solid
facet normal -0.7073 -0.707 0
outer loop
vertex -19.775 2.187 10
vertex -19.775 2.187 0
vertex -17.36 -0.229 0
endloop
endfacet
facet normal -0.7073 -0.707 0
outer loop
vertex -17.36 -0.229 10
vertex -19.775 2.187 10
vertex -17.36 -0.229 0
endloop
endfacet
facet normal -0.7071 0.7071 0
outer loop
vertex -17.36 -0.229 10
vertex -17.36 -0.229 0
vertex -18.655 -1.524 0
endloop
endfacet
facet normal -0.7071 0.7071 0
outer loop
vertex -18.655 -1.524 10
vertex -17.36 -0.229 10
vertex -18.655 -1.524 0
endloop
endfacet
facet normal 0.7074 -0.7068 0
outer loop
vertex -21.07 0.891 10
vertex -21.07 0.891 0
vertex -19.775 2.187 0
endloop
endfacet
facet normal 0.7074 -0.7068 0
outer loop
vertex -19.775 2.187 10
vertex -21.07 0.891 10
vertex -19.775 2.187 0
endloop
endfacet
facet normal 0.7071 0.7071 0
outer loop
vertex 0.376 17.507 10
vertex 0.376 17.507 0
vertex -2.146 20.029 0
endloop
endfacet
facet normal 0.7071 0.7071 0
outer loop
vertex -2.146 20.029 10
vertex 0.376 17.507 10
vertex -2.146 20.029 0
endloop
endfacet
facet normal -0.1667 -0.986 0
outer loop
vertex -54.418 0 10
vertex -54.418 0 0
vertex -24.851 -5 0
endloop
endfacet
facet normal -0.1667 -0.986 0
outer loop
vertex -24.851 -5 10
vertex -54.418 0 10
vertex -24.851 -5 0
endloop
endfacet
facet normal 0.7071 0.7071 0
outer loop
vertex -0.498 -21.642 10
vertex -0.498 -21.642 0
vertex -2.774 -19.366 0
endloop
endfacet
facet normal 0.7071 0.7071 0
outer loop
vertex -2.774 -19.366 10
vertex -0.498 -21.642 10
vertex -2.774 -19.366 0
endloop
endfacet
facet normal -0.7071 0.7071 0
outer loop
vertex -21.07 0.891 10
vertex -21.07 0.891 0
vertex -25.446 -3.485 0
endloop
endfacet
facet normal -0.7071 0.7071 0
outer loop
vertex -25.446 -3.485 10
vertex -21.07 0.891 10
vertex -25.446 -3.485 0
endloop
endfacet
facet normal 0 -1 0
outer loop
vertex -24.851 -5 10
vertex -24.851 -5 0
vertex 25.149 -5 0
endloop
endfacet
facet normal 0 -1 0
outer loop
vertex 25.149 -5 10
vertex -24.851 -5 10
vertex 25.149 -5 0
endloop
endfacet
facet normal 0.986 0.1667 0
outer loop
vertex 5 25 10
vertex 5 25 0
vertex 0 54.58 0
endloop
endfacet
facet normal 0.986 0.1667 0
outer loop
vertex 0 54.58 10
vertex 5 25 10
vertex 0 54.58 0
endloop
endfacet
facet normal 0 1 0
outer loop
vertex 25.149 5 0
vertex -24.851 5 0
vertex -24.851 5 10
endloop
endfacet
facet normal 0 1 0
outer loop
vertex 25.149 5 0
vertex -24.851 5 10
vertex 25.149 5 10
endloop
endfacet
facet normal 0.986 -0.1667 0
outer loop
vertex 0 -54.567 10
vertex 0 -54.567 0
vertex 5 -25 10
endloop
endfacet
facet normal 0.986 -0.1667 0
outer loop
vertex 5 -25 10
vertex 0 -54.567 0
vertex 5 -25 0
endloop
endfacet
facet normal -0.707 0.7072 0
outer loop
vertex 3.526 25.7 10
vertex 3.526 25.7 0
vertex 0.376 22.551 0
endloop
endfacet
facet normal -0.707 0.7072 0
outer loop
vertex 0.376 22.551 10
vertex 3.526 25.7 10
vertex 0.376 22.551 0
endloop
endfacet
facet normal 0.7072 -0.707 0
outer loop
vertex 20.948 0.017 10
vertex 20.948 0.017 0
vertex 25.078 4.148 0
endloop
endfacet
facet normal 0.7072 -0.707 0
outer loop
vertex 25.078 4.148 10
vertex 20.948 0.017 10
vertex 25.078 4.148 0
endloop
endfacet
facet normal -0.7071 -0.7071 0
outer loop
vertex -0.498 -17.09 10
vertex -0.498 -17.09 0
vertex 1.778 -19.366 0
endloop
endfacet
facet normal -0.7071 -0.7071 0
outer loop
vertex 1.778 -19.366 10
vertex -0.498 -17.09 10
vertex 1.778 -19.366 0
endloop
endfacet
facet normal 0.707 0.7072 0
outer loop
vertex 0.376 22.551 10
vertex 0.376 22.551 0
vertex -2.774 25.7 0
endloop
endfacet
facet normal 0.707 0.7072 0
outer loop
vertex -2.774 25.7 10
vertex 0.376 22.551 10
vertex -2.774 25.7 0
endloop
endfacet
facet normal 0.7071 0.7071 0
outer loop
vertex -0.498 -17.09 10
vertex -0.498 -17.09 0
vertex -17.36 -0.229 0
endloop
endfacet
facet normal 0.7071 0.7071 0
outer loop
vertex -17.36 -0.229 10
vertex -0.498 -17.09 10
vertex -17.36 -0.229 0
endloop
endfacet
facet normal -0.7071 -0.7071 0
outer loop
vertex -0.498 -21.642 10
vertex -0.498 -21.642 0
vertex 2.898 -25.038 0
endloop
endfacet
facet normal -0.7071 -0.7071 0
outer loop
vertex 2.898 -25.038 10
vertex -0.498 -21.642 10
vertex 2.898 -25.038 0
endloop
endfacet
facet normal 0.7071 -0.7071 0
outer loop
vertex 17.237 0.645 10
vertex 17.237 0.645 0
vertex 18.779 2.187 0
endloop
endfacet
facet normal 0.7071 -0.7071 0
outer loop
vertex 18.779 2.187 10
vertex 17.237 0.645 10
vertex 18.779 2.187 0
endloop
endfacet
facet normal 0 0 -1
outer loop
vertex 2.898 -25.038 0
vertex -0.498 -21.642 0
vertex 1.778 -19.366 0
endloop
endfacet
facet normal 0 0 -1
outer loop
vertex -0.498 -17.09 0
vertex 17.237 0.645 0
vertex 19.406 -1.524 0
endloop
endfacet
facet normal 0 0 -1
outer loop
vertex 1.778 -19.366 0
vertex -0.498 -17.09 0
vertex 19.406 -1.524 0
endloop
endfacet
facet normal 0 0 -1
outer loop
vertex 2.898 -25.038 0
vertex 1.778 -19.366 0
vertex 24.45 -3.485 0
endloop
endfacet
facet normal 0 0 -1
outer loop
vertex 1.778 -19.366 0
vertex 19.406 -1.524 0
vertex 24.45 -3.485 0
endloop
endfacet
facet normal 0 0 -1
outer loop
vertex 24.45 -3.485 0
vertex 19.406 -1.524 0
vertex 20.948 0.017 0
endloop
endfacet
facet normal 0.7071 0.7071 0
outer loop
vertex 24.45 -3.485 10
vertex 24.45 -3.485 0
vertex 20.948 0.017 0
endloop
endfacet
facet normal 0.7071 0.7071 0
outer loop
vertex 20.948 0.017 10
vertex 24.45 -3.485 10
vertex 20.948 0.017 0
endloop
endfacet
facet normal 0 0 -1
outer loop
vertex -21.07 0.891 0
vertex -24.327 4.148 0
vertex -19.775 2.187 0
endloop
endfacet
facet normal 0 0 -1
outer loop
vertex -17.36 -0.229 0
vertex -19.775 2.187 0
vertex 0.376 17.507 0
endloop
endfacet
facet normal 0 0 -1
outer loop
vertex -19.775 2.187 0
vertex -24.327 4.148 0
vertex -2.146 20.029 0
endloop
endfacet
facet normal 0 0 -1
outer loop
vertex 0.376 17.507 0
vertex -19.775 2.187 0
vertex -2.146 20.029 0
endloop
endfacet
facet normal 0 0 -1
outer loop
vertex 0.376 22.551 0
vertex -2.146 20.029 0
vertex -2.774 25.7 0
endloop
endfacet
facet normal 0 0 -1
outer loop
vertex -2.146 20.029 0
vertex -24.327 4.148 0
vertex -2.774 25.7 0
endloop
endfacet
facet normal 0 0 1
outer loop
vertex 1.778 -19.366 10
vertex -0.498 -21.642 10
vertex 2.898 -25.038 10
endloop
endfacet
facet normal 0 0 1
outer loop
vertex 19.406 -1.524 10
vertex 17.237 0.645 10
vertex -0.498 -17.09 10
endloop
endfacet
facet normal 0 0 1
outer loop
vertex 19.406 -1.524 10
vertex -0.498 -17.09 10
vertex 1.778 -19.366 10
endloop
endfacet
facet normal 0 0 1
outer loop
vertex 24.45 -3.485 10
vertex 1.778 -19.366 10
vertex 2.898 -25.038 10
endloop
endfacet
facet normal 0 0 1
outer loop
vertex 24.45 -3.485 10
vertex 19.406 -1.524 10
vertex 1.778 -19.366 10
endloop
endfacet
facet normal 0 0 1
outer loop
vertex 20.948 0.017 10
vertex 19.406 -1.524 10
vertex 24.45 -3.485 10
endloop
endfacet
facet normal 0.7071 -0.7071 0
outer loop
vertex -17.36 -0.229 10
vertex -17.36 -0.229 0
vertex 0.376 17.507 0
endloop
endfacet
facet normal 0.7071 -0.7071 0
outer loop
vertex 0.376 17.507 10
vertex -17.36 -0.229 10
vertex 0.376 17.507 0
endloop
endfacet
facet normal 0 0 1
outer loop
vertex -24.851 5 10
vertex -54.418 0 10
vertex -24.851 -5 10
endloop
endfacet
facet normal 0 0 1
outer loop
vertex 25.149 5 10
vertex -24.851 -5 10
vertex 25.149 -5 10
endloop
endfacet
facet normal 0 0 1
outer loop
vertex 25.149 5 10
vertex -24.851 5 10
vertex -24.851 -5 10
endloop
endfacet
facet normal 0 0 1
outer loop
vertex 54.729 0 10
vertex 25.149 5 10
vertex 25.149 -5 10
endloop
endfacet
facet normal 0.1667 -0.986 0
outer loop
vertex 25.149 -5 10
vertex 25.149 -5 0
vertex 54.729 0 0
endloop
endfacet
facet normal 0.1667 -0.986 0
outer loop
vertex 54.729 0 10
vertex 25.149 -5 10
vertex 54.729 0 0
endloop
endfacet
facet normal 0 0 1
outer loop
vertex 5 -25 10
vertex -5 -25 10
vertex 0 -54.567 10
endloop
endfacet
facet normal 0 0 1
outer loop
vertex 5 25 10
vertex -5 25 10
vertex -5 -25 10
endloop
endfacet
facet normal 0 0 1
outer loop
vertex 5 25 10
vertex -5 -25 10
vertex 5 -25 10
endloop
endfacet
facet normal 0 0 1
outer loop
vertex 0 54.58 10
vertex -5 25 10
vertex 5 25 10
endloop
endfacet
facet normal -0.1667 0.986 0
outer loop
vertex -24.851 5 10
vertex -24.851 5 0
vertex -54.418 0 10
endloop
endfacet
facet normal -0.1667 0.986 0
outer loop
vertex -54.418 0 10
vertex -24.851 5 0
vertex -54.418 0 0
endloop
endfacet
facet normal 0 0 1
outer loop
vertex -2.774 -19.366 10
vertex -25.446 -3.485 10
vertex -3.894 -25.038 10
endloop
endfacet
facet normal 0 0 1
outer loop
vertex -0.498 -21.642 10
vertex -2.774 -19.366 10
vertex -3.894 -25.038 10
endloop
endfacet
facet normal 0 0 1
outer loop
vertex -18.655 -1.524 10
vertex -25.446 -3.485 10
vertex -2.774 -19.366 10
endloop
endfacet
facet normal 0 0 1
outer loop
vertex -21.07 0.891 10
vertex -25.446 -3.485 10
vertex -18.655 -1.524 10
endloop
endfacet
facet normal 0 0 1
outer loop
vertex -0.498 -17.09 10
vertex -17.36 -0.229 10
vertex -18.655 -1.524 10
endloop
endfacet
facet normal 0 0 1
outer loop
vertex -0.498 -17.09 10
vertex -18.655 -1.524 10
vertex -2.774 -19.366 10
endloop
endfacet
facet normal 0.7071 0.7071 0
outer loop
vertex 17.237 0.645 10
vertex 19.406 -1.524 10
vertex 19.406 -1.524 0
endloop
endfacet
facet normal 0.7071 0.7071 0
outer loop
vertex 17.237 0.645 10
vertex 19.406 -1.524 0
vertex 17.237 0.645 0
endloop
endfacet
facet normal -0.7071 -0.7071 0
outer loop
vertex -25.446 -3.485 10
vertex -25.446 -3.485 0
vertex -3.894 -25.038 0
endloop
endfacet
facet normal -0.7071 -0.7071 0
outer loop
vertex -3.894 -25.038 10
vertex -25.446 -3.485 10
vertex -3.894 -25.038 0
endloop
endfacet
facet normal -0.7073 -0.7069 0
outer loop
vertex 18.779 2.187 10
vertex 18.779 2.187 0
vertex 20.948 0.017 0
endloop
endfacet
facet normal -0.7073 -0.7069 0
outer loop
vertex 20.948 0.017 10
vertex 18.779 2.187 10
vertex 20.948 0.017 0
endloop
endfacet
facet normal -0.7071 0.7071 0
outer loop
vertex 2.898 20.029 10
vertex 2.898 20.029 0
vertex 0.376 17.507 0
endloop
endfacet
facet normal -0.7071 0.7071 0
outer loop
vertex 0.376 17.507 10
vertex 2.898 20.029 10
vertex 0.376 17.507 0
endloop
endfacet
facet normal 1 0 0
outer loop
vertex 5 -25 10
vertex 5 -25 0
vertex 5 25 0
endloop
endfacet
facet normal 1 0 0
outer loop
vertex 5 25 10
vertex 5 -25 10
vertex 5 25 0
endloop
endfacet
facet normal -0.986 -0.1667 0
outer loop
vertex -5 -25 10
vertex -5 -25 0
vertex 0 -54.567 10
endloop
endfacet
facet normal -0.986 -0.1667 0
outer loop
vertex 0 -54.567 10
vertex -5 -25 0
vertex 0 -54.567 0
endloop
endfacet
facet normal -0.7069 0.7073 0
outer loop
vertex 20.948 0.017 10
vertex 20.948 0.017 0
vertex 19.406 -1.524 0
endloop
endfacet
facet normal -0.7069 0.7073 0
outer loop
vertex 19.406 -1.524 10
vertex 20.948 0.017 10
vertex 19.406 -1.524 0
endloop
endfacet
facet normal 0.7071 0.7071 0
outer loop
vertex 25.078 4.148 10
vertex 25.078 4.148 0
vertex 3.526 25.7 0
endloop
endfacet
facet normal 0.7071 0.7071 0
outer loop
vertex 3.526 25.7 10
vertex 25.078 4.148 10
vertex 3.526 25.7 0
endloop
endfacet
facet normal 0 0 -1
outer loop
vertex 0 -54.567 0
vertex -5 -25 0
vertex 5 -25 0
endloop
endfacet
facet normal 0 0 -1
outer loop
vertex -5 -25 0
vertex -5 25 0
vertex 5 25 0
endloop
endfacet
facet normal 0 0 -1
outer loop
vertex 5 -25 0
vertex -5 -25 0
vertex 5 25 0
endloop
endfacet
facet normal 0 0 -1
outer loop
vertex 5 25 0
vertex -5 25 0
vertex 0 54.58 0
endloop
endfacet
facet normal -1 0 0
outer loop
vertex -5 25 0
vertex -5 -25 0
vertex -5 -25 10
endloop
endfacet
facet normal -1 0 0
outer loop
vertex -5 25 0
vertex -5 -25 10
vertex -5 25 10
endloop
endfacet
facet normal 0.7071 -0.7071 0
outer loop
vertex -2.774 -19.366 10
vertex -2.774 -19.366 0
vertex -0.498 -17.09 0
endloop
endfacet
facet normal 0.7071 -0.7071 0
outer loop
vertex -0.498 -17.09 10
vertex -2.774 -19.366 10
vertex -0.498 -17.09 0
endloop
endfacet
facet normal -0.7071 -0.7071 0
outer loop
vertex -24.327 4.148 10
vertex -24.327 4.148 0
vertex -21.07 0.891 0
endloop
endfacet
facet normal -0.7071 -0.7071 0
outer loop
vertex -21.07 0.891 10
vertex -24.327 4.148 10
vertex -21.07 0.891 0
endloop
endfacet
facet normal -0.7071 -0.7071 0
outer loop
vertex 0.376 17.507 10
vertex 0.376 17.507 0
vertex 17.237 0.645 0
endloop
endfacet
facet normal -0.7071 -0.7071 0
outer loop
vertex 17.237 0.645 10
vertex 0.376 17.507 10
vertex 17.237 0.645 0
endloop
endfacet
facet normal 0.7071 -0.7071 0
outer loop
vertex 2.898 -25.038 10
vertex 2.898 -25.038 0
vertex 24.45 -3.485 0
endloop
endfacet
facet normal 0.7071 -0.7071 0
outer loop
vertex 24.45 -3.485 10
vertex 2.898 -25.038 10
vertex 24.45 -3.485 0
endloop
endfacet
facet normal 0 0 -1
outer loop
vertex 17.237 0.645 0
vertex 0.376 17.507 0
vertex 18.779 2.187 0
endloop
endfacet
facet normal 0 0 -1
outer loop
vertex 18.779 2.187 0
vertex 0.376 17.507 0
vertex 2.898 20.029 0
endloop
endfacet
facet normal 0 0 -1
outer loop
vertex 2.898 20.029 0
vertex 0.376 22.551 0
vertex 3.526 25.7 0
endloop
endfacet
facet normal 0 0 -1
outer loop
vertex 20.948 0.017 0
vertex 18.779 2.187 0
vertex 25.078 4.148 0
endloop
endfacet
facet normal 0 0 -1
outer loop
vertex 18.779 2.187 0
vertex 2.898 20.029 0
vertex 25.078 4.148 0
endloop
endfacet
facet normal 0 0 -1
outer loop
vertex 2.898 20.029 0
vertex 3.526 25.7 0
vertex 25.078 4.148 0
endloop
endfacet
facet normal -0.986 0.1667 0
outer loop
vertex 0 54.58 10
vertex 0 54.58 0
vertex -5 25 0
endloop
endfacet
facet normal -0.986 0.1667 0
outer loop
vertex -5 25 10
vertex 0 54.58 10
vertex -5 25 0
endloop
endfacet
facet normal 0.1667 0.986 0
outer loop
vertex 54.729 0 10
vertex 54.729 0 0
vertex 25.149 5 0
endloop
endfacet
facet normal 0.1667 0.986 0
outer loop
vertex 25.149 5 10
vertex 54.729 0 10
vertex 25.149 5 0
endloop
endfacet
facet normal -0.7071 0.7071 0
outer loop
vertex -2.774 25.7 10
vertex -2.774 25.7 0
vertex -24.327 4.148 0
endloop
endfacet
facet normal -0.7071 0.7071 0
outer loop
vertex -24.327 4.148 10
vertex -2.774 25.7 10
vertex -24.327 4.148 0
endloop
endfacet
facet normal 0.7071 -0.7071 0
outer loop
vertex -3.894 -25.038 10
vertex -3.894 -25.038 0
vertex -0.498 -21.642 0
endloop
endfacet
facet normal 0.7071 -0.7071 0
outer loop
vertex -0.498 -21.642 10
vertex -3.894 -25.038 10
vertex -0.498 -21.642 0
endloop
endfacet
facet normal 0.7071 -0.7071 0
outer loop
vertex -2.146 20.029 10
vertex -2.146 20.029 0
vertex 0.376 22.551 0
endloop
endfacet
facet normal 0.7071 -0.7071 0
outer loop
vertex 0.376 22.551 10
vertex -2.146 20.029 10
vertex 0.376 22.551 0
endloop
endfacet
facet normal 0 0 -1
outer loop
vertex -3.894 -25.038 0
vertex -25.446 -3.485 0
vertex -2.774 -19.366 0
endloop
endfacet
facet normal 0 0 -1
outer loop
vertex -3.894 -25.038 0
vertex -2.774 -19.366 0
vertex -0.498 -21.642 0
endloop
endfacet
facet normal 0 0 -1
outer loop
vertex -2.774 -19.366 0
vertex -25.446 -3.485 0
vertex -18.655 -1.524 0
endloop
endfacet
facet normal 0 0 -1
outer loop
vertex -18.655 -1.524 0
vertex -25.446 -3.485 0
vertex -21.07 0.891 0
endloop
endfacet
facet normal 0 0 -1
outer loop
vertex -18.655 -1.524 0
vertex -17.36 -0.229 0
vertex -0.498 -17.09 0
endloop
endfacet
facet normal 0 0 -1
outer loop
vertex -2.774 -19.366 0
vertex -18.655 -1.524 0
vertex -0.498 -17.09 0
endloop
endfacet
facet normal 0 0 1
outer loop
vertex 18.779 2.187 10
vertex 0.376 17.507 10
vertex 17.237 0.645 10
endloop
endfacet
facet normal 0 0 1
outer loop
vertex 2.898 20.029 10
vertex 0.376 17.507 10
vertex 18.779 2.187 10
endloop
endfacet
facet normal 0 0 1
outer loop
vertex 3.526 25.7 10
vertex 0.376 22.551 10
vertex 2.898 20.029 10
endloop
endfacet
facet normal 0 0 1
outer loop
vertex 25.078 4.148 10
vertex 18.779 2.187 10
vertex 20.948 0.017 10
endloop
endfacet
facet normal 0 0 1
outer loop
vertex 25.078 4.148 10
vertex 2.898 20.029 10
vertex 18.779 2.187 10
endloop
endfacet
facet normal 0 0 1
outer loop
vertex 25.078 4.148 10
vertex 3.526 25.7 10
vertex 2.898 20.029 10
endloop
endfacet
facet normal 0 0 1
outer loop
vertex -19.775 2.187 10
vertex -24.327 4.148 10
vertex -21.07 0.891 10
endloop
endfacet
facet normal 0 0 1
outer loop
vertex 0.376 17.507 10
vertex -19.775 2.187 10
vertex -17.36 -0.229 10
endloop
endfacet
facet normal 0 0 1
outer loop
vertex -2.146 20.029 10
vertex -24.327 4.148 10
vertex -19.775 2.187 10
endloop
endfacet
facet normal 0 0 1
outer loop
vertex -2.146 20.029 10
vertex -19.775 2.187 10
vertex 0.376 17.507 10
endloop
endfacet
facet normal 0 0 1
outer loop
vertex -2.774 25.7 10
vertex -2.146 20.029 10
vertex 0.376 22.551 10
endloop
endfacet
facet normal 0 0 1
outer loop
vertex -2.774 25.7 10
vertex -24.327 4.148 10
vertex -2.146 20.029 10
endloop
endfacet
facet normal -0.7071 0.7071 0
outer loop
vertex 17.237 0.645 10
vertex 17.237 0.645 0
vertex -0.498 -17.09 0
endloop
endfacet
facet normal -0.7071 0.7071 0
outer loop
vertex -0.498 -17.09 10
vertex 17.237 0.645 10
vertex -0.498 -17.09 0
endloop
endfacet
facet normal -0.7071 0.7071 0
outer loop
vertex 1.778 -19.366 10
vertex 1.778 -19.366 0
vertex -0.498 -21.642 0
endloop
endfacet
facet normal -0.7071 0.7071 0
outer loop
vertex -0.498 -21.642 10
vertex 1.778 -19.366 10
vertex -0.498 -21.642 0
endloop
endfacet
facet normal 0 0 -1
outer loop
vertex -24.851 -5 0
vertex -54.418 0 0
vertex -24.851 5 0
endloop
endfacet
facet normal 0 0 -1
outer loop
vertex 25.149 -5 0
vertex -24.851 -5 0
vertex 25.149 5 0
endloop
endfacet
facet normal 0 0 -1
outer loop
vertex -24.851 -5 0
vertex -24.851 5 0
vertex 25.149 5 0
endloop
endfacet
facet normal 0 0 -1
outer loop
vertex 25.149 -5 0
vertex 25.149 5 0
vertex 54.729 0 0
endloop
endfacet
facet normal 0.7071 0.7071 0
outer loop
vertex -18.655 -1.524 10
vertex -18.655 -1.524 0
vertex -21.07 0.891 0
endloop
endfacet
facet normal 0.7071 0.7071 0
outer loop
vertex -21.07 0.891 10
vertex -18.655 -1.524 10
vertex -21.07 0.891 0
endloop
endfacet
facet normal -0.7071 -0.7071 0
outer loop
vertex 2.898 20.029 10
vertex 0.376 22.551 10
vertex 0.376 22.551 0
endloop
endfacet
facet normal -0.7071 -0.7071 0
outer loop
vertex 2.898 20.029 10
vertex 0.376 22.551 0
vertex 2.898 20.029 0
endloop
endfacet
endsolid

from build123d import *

# Parameters (mm, degrees)
F3_DEPTH = 10
F0_W     = 10
F0_H     = 50
F1_W     = 50
F1_H     = 10


with BuildPart() as f3:
    # F2 (on Top) → F3 (new body)
    with BuildSketch(Plane.XY):
        Polygon((-17.3595256848, -0.2285738221), (0.3757243976, 17.5066762604), (-2.1462140696, 20.0286147276), (0.3757243976, 22.5505531948), (-2.7740773908, 25.7003549833), (-24.3266920814, 4.1477402927), (-21.0700405853, 0.8910887966), (-19.7746144444, 2.1865149375), align=None)
    extrude(amount=F3_DEPTH)


with BuildPart() as f3b:
    # F2 (on Top) → F3, piece 2 (new body)
    with BuildSketch(Plane.XY):
        Polygon((0.3757243976, 22.5505531948), (2.8976628648, 20.0286147276), (0.3757243976, 17.5066762604), (17.2372120748, 0.6451885831), (18.778537244, 2.1865137523), (20.9477257901, 0.0173252062), (25.0781408766, 4.1477402927), (3.525526186, 25.7003549833), align=None)
    extrude(amount=F3_DEPTH)


with BuildPart() as f3c:
    # F2 (on Top) → F3, piece 3 (new body)
    with BuildSketch(Plane.XY):
        Polygon((19.4064006209, -1.523999963), (17.2372120748, 0.6451885831), (-0.4980380076, -17.0900614993), (1.7780002462, -19.3660997531), (-0.4980391928, -21.642139192), (2.8976628091, -25.037841194), (24.4502774997, -3.4852265034), (20.9477257901, 0.0173252062), align=None)
    extrude(amount=F3_DEPTH)


with BuildPart() as f3d:
    # F2 (on Top) → F3, piece 4 (new body)
    with BuildSketch(Plane.XY):
        Polygon((-0.4980380076, -17.0900614993), (-17.3595256848, -0.2285738221), (-18.6549518257, -1.523999963), (-21.0700405853, 0.8910887966), (-25.4463547001, -3.4852253182), (-3.8937400095, -25.0378400087), (-0.4980391928, -21.642139192), (-2.7740774466, -19.3661009383), align=None)
    extrude(amount=F3_DEPTH)


with BuildPart() as f3e:
    # F0 (on Top) → F3, piece 5 (new body)
    with BuildSketch(Plane.XY):
        Rectangle(F0_W, F0_H)
        Polygon((0, 54.5803989155), (-5, 25), (5, 25), align=None)
        Polygon((5, -25), (-5, -25), (0, -54.5670464635), align=None)
    extrude(amount=F3_DEPTH)


with BuildPart() as f3f:
    # F1 (on Top) → F3, piece 6 (new body)
    with BuildSketch(Plane.XY):
        Polygon((54.7289852769, 0), (25.1485863614, 5), (25.1485863614, -5), align=None)
        with Locations((0.1485863614, 0)):
            Rectangle(F1_W, F1_H)
        Polygon((-24.8514136386, -5), (-24.8514136386, 5), (-54.4184601021, 0), align=None)
    extrude(amount=F3_DEPTH)


solid = Compound([f3.part, f3b.part, f3c.part, f3d.part, f3e.part, f3f.part])
